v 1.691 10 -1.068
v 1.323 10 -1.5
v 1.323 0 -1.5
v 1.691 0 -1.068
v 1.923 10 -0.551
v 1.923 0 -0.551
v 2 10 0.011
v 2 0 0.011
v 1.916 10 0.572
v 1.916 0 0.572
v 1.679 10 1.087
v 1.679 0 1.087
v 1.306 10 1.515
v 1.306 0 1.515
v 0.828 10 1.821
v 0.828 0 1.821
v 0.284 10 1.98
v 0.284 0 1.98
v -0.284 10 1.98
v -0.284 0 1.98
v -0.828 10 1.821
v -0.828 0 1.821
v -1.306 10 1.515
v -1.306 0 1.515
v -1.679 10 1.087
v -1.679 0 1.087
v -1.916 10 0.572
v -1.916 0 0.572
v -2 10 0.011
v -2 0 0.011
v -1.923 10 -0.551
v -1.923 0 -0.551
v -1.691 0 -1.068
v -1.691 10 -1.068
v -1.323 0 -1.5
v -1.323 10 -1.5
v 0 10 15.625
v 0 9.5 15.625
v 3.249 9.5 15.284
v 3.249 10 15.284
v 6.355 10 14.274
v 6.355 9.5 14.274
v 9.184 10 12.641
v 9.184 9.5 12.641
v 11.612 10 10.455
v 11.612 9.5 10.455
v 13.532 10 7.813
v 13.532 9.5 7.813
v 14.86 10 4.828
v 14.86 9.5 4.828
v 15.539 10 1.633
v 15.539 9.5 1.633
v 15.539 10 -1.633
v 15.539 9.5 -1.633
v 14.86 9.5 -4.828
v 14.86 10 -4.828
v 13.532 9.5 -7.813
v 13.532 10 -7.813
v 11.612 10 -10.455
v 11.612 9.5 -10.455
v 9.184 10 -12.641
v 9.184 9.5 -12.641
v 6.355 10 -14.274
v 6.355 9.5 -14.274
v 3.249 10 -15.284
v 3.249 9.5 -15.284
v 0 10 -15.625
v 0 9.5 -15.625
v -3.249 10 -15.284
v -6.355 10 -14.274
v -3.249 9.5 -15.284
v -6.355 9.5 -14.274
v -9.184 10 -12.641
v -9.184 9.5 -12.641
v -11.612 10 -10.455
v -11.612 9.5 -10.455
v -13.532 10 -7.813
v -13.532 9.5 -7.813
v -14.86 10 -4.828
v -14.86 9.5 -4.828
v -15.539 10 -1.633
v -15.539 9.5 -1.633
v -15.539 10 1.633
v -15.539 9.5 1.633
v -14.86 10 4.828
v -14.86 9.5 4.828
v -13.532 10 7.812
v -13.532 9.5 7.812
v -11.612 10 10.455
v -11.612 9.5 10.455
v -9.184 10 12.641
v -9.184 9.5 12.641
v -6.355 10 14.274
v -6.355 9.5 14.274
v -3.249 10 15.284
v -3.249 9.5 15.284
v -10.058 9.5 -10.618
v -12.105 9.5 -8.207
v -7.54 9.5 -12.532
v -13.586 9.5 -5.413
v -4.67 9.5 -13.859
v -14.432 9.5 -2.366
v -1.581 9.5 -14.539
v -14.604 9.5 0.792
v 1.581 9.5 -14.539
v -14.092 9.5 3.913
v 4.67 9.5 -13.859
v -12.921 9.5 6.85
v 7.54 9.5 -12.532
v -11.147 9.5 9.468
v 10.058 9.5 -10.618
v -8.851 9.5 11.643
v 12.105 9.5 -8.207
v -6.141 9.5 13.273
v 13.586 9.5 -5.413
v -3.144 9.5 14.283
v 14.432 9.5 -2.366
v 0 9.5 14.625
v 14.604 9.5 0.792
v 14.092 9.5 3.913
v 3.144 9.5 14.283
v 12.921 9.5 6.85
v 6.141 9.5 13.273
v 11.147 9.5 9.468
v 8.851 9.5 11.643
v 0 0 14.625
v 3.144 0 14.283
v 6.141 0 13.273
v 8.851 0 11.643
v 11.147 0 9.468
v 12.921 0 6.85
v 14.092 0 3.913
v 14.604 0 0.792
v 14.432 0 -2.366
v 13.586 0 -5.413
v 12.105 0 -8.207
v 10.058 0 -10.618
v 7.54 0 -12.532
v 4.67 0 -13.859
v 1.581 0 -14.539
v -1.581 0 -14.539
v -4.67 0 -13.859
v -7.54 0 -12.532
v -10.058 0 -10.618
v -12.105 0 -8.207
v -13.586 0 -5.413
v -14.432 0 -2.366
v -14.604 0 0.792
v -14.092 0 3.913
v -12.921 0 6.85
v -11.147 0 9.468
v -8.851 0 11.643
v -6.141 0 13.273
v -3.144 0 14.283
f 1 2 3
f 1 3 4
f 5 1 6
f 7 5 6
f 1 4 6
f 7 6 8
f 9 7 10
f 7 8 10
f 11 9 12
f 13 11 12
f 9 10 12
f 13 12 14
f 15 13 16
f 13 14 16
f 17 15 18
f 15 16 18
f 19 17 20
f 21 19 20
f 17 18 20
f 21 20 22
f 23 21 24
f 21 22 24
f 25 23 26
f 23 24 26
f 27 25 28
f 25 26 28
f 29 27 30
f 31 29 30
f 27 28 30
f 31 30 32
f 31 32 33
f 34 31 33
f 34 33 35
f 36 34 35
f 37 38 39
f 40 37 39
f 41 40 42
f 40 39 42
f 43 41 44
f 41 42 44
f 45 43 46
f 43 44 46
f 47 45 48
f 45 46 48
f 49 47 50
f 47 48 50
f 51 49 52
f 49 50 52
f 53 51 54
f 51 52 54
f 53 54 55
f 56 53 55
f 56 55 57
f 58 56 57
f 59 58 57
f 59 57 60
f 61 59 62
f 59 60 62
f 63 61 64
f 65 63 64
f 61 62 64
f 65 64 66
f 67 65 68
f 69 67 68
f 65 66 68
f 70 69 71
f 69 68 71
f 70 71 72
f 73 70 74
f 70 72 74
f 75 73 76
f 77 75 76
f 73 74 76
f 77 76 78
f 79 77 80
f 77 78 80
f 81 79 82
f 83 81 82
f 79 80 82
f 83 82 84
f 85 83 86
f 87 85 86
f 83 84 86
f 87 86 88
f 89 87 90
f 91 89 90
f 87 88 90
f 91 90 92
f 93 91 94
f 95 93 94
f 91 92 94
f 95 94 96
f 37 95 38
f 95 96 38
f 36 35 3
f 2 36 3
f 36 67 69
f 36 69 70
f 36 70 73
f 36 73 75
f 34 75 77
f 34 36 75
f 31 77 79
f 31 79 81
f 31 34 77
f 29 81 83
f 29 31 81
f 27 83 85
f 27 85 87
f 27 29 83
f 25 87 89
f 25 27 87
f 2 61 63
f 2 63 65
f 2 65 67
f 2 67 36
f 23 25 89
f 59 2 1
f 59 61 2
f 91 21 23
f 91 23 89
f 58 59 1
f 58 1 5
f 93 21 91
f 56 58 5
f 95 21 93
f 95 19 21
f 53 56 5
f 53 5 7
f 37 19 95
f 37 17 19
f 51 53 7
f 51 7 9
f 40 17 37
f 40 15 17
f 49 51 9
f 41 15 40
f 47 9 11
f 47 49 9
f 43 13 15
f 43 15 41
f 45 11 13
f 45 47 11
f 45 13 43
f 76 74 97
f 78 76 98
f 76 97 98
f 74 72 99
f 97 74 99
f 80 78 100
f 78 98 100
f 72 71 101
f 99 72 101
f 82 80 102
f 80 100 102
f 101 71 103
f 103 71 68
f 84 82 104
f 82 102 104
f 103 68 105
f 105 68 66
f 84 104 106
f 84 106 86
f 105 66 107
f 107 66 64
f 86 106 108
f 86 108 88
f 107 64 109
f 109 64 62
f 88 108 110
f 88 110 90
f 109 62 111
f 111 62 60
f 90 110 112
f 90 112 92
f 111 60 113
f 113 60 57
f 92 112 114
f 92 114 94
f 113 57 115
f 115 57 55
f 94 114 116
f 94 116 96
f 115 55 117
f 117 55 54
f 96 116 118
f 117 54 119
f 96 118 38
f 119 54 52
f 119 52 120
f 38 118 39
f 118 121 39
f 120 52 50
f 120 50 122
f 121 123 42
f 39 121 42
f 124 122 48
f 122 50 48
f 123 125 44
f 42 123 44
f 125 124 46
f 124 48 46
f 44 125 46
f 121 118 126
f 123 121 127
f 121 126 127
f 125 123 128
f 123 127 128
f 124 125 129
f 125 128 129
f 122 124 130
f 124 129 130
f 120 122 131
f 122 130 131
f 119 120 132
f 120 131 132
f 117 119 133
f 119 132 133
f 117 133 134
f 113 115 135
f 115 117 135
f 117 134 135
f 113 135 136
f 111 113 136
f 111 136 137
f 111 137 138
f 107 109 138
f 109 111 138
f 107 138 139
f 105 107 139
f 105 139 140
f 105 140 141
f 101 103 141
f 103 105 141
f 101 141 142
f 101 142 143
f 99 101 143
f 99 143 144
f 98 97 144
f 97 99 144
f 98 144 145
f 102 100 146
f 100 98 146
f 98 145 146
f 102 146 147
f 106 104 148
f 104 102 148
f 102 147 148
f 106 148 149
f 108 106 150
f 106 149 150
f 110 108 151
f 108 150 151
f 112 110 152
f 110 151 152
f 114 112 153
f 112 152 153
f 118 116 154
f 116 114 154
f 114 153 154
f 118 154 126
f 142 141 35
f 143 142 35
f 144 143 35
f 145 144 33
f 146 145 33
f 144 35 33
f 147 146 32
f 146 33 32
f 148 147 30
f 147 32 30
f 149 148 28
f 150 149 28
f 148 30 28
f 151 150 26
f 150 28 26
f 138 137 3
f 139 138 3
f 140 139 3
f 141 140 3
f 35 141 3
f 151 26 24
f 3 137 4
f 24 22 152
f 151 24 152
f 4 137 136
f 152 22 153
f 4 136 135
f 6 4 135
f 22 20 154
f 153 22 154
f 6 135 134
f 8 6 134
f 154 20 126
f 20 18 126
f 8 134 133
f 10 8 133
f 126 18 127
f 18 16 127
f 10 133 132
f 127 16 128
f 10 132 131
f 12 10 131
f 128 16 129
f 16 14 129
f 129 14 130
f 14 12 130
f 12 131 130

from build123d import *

# Parameters (mm, degrees)
SKETCH1_R           = 14.625
BOSS_EXTRUDE1_DEPTH = 10
BOSS_EXTRUDE2_START = -0.5
SKETCH2_R           = 15.625
BOSS_EXTRUDE2_DEPTH = 0.5


with BuildPart() as part:
    # Sketch1 → Boss-Extrude1 (new body)
    with BuildSketch(Plane(origin=(0, 0, 0), x_dir=(1, 0, 0), z_dir=(0, 1, 0))):
        with Locations(Location((0, 0, 0), (0, 0, 270))):
            Circle(SKETCH1_R)
        with BuildLine():
            Line((-1.322875656, 1.5), (1.322875656, 1.5))
            ThreePointArc((1.322875656, 1.5), (0, -2), (-1.322875656, 1.5))
        make_face(mode=Mode.SUBTRACT)
    extrude(amount=BOSS_EXTRUDE1_DEPTH)

    # Sketch2 → Boss-Extrude2 (add)
    with BuildSketch(Plane(origin=(0, 10, 0), x_dir=(1, 0, 0), z_dir=(0, 1, 0)).offset(BOSS_EXTRUDE2_START)):
        with Locations(Location((0, 0, 0), (0, 0, 270))):
            Circle(SKETCH2_R)
        with BuildLine():
            Line((-1.322875656, 1.5), (1.322875656, 1.5))
            ThreePointArc((1.322875656, 1.5), (0, -2), (-1.322875656, 1.5))
        make_face(mode=Mode.SUBTRACT)
    extrude(amount=BOSS_EXTRUDE2_DEPTH)


solid = part.part
